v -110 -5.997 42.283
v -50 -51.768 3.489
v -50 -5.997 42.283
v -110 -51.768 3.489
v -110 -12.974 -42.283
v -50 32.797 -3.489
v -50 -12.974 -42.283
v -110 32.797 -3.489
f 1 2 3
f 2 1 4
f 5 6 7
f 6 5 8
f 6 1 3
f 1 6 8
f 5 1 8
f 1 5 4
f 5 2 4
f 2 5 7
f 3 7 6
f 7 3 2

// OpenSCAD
// file: constants.scad
// Author: Edward Middleton-Smith
// Project: DNA Double Helix
// Technology: Constants and Variables
// Feature: 

// constants
radius_rotation_helix = 80; // radius of helix (displacement of any part of helix from central axis)
radius_strand_helix = 20;
angle_twist_total = 1440;
height = 1300;
rise = 240; // vertical spacing between base-pair rungs
length_discretisation = 1; // length_discretisationretisation of points per units length
pi = 3.14159265359; // rounded

// intermediate variables
angle_incline = asin(height * 360 / angle_twist_total / 2 / pi / radius_rotation_helix);
echo("angle_incline: ", angle_incline);
// main file
// Author: Edward Middleton-Smith
// Project: Miscellaneous
// Technology: DNA Double Helix
// Feature: Main

include <constants.scad>;

module tip_cutting_cube (radius_rotation_helix, radius_strand_helix, index_tip_helix, angle_incline, height, angle_twist_total) {
    dx = radius_rotation_helix / 2 + radius_strand_helix * 2;
    dy = radius_strand_helix * 2 * (1 - cos(angle_incline)); 
    edge_size = 3 * radius_strand_helix;
    echo("cutting cube edge size: ", edge_size);
    requires_rotation_to_alternative_tip_at_end = (index_tip_helix == 1 || index_tip_helix == 4);
    tip_is_at_top = (index_tip_helix == 3 || index_tip_helix == 4);
    height_tip_top = height;
    rotate([0, 0, (requires_rotation_to_alternative_tip_at_end ? 180 : 0) + (tip_is_at_top ? 0 : 0)]) translate([dx, dy, tip_is_at_top ? height_tip_top : 0]) rotate([-angle_incline, 0, 0]) cube(edge_size, center = true);
}

index_tip_helix = 1; // 1 - 4

tip_cutting_cube(radius_rotation_helix, radius_strand_helix, index_tip_helix, angle_incline, height, angle_twist_total);
